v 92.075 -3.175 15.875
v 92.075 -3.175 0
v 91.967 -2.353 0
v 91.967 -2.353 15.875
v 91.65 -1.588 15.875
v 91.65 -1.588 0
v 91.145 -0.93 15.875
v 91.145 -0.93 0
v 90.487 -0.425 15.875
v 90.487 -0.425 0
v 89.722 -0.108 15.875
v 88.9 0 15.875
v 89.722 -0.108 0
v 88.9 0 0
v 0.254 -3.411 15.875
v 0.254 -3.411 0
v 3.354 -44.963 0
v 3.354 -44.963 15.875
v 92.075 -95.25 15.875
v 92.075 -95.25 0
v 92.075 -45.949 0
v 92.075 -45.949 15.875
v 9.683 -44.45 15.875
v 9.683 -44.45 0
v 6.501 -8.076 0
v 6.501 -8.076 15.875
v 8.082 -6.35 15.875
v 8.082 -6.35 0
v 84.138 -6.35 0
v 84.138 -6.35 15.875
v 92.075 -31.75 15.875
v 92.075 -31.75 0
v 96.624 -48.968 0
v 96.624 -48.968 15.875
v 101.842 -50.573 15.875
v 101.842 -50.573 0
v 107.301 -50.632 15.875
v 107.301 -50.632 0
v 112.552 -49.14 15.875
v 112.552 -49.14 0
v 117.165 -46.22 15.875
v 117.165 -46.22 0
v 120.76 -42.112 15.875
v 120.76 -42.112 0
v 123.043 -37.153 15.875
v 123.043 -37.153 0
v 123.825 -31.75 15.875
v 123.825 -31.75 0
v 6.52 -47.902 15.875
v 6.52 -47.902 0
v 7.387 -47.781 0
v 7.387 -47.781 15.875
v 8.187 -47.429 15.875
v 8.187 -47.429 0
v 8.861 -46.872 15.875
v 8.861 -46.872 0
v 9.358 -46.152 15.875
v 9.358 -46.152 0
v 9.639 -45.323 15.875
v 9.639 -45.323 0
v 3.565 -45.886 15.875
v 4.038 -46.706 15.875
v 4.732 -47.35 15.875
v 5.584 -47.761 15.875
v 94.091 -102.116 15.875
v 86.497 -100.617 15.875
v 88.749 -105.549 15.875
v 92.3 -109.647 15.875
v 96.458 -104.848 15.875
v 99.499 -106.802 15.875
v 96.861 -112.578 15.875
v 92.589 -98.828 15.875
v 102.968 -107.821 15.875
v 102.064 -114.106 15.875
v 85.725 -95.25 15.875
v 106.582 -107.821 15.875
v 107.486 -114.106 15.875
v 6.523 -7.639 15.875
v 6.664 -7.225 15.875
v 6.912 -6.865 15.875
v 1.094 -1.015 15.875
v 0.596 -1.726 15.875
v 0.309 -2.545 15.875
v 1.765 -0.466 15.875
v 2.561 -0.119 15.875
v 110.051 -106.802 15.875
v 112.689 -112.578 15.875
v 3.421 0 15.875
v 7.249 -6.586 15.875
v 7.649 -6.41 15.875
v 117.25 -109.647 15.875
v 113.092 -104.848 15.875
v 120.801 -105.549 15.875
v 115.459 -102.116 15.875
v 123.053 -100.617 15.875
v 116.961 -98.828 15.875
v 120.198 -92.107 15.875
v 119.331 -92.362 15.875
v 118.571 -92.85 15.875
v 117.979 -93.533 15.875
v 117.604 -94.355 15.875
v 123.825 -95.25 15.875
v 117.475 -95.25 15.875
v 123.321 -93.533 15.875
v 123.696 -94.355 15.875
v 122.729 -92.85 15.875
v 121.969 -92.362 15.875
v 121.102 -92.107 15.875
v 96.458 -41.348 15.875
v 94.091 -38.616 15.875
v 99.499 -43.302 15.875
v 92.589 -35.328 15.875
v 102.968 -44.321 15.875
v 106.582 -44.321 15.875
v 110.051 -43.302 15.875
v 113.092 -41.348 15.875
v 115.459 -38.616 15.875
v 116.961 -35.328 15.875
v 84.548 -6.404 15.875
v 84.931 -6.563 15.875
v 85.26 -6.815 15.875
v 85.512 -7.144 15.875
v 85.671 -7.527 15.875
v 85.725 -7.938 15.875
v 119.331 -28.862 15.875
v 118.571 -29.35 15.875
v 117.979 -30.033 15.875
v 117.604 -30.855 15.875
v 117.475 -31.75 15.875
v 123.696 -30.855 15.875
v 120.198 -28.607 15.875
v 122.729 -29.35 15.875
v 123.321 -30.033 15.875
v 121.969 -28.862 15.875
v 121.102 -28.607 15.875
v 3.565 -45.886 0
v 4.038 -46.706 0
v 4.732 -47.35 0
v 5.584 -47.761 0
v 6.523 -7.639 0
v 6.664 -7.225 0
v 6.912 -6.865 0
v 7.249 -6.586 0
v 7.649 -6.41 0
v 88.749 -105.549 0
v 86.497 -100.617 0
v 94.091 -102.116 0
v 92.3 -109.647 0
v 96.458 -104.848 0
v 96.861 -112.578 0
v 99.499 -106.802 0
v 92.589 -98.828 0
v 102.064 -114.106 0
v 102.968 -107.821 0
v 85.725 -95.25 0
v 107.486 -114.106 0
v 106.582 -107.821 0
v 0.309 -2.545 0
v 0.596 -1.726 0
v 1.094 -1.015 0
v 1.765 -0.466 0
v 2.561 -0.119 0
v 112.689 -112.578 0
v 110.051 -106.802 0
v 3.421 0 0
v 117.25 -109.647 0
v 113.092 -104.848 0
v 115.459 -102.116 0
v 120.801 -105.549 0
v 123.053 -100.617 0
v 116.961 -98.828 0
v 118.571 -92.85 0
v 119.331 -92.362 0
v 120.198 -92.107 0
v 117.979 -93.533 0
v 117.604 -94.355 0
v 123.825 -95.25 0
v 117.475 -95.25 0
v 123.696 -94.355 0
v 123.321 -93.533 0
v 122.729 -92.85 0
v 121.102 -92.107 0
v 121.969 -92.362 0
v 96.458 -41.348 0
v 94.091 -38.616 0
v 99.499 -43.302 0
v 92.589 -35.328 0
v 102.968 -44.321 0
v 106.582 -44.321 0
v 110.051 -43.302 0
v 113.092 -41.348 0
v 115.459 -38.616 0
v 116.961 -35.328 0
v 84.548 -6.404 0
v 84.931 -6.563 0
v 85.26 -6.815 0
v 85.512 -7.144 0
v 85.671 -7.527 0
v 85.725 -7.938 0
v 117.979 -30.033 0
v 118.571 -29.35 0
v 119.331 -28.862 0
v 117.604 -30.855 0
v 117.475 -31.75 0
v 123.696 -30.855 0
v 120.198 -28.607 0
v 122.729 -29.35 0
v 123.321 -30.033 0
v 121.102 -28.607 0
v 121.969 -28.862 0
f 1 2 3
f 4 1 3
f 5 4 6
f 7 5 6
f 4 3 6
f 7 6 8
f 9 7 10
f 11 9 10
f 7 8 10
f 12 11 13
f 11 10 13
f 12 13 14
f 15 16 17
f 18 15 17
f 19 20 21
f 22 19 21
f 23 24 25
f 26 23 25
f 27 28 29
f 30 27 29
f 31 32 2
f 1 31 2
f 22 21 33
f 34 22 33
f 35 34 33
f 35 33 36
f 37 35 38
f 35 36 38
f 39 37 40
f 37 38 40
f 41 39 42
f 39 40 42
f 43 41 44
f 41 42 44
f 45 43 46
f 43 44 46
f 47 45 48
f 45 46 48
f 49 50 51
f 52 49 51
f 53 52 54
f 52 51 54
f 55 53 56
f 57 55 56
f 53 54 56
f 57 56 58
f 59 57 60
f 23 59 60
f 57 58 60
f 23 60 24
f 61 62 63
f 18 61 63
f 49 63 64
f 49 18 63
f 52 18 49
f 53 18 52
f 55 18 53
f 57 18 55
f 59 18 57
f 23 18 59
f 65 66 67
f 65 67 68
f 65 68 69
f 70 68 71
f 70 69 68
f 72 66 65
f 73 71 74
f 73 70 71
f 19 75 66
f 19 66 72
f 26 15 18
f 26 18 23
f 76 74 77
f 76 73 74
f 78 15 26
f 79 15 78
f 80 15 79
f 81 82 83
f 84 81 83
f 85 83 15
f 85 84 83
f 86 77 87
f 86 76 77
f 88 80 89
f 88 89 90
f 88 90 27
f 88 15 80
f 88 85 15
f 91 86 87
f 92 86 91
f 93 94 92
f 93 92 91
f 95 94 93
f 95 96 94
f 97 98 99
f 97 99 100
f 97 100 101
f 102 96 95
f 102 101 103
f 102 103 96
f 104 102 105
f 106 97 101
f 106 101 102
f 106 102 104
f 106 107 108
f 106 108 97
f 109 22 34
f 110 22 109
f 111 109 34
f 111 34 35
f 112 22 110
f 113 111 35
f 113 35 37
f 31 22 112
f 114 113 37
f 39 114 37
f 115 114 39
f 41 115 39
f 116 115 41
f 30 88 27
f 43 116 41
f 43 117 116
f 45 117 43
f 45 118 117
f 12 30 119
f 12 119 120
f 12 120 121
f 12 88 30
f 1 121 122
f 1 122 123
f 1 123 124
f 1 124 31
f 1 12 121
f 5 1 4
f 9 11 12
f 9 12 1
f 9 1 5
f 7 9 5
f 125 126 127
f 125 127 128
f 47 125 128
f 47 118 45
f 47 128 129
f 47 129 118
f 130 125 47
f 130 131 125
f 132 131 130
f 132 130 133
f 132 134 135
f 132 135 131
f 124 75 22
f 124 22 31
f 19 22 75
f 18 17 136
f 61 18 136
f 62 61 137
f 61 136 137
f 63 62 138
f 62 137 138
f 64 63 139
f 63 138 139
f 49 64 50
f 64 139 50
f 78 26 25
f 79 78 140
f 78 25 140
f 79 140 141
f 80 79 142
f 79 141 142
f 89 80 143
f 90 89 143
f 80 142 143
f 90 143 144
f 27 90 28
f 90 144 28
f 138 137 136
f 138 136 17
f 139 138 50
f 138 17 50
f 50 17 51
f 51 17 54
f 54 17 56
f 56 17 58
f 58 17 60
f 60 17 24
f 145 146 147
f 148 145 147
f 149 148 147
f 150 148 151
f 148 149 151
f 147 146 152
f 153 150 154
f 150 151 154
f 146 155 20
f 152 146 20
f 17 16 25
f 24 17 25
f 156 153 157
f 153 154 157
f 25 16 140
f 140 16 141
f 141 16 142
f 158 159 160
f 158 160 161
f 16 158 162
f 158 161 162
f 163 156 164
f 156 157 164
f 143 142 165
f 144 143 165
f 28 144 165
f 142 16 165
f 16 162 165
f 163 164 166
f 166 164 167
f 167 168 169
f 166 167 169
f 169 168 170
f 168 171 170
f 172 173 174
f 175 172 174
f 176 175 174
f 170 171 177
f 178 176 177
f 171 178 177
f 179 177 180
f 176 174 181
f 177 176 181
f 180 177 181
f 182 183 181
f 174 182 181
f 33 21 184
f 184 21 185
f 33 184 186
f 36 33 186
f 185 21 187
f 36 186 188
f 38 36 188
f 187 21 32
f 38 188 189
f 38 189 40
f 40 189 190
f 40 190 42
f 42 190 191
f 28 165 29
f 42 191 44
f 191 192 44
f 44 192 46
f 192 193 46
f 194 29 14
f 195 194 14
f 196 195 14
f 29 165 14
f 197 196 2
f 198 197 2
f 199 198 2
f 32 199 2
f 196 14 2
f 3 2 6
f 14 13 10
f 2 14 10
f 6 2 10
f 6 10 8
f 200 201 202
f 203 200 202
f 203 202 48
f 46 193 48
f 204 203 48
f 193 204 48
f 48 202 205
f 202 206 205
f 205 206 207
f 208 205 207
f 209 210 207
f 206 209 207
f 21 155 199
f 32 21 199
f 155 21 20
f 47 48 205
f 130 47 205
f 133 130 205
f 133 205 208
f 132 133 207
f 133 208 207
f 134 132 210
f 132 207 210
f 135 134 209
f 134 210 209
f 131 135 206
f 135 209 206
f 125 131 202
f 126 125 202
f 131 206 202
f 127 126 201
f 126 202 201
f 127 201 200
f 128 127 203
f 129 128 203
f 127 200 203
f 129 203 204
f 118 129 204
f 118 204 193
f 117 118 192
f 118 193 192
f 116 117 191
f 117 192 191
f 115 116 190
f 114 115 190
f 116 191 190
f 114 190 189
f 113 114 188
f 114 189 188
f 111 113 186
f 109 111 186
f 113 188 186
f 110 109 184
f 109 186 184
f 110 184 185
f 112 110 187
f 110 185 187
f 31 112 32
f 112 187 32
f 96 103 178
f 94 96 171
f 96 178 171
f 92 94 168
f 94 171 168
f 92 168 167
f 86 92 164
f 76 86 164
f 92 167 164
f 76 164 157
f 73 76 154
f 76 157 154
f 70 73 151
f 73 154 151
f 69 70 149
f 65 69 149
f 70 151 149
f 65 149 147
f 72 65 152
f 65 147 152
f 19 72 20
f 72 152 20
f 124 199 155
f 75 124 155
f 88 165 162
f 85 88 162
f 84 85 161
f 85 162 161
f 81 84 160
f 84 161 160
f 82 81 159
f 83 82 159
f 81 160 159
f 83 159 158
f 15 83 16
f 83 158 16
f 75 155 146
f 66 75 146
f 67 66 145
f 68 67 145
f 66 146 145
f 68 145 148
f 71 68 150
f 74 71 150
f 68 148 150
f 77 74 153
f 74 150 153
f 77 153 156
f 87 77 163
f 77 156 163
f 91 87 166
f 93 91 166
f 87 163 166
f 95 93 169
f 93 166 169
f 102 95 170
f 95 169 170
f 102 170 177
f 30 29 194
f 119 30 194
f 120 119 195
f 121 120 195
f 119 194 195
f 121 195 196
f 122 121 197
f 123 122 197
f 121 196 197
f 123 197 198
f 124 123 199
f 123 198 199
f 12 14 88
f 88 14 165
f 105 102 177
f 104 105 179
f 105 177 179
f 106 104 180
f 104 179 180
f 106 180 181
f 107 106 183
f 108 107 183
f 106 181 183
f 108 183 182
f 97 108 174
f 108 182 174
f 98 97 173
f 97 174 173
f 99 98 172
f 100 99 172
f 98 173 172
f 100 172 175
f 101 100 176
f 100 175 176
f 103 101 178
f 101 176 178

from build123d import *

# Parameters (mm, degrees)
F1_DEPTH = 15.875


with BuildPart() as f1:
    # F0 (on Top) → F1 (new body)
    with BuildSketch(Plane.XY):
        with BuildLine():
            Line((88.9, 0), (3.420675, 0))
            ThreePointArc((3.420675, 0), (1.093601, -1.015058), (0.254473, -3.411196))
            Line((0.254473, -3.411196), (3.354198, -44.962916))
            ThreePointArc((3.354198, -44.962916), (4.360458, -47.053794), (6.5204, -47.901719))
            ThreePointArc((6.5204, -47.901719), (8.861255, -46.871718), (9.683318, -44.45))
            Line((9.683318, -44.45), (6.500993, -8.07586))
            ThreePointArc((6.500993, -8.07586), (6.912024, -6.865001), (8.082452, -6.35))
            Line((8.082452, -6.35), (84.1375, -6.35))
            ThreePointArc((84.1375, -6.35), (85.260032, -6.814968), (85.725, -7.9375))
            Line((85.725, -7.9375), (85.725, -95.25))
            ThreePointArc((85.725, -95.25), (104.775, -114.3), (123.825, -95.25))
            ThreePointArc((123.825, -95.25), (120.65, -92.075), (117.475, -95.25))
            ThreePointArc((117.475, -95.25), (104.775, -107.95), (92.075, -95.25))
            Line((92.075, -95.25), (92.075, -45.949032))
            ThreePointArc((92.075, -45.949032), (112.55213, -49.140191), (123.825, -31.75))
            ThreePointArc((123.825, -31.75), (120.65, -28.575), (117.475, -31.75))
            ThreePointArc((117.475, -31.75), (104.775, -44.45), (92.075, -31.75))
            Line((92.075, -31.75), (92.075, -3.175))
            ThreePointArc((92.075, -3.175), (91.145064, -0.929936), (88.9, 0))
        make_face()
    extrude(amount=F1_DEPTH)


solid = f1.part
